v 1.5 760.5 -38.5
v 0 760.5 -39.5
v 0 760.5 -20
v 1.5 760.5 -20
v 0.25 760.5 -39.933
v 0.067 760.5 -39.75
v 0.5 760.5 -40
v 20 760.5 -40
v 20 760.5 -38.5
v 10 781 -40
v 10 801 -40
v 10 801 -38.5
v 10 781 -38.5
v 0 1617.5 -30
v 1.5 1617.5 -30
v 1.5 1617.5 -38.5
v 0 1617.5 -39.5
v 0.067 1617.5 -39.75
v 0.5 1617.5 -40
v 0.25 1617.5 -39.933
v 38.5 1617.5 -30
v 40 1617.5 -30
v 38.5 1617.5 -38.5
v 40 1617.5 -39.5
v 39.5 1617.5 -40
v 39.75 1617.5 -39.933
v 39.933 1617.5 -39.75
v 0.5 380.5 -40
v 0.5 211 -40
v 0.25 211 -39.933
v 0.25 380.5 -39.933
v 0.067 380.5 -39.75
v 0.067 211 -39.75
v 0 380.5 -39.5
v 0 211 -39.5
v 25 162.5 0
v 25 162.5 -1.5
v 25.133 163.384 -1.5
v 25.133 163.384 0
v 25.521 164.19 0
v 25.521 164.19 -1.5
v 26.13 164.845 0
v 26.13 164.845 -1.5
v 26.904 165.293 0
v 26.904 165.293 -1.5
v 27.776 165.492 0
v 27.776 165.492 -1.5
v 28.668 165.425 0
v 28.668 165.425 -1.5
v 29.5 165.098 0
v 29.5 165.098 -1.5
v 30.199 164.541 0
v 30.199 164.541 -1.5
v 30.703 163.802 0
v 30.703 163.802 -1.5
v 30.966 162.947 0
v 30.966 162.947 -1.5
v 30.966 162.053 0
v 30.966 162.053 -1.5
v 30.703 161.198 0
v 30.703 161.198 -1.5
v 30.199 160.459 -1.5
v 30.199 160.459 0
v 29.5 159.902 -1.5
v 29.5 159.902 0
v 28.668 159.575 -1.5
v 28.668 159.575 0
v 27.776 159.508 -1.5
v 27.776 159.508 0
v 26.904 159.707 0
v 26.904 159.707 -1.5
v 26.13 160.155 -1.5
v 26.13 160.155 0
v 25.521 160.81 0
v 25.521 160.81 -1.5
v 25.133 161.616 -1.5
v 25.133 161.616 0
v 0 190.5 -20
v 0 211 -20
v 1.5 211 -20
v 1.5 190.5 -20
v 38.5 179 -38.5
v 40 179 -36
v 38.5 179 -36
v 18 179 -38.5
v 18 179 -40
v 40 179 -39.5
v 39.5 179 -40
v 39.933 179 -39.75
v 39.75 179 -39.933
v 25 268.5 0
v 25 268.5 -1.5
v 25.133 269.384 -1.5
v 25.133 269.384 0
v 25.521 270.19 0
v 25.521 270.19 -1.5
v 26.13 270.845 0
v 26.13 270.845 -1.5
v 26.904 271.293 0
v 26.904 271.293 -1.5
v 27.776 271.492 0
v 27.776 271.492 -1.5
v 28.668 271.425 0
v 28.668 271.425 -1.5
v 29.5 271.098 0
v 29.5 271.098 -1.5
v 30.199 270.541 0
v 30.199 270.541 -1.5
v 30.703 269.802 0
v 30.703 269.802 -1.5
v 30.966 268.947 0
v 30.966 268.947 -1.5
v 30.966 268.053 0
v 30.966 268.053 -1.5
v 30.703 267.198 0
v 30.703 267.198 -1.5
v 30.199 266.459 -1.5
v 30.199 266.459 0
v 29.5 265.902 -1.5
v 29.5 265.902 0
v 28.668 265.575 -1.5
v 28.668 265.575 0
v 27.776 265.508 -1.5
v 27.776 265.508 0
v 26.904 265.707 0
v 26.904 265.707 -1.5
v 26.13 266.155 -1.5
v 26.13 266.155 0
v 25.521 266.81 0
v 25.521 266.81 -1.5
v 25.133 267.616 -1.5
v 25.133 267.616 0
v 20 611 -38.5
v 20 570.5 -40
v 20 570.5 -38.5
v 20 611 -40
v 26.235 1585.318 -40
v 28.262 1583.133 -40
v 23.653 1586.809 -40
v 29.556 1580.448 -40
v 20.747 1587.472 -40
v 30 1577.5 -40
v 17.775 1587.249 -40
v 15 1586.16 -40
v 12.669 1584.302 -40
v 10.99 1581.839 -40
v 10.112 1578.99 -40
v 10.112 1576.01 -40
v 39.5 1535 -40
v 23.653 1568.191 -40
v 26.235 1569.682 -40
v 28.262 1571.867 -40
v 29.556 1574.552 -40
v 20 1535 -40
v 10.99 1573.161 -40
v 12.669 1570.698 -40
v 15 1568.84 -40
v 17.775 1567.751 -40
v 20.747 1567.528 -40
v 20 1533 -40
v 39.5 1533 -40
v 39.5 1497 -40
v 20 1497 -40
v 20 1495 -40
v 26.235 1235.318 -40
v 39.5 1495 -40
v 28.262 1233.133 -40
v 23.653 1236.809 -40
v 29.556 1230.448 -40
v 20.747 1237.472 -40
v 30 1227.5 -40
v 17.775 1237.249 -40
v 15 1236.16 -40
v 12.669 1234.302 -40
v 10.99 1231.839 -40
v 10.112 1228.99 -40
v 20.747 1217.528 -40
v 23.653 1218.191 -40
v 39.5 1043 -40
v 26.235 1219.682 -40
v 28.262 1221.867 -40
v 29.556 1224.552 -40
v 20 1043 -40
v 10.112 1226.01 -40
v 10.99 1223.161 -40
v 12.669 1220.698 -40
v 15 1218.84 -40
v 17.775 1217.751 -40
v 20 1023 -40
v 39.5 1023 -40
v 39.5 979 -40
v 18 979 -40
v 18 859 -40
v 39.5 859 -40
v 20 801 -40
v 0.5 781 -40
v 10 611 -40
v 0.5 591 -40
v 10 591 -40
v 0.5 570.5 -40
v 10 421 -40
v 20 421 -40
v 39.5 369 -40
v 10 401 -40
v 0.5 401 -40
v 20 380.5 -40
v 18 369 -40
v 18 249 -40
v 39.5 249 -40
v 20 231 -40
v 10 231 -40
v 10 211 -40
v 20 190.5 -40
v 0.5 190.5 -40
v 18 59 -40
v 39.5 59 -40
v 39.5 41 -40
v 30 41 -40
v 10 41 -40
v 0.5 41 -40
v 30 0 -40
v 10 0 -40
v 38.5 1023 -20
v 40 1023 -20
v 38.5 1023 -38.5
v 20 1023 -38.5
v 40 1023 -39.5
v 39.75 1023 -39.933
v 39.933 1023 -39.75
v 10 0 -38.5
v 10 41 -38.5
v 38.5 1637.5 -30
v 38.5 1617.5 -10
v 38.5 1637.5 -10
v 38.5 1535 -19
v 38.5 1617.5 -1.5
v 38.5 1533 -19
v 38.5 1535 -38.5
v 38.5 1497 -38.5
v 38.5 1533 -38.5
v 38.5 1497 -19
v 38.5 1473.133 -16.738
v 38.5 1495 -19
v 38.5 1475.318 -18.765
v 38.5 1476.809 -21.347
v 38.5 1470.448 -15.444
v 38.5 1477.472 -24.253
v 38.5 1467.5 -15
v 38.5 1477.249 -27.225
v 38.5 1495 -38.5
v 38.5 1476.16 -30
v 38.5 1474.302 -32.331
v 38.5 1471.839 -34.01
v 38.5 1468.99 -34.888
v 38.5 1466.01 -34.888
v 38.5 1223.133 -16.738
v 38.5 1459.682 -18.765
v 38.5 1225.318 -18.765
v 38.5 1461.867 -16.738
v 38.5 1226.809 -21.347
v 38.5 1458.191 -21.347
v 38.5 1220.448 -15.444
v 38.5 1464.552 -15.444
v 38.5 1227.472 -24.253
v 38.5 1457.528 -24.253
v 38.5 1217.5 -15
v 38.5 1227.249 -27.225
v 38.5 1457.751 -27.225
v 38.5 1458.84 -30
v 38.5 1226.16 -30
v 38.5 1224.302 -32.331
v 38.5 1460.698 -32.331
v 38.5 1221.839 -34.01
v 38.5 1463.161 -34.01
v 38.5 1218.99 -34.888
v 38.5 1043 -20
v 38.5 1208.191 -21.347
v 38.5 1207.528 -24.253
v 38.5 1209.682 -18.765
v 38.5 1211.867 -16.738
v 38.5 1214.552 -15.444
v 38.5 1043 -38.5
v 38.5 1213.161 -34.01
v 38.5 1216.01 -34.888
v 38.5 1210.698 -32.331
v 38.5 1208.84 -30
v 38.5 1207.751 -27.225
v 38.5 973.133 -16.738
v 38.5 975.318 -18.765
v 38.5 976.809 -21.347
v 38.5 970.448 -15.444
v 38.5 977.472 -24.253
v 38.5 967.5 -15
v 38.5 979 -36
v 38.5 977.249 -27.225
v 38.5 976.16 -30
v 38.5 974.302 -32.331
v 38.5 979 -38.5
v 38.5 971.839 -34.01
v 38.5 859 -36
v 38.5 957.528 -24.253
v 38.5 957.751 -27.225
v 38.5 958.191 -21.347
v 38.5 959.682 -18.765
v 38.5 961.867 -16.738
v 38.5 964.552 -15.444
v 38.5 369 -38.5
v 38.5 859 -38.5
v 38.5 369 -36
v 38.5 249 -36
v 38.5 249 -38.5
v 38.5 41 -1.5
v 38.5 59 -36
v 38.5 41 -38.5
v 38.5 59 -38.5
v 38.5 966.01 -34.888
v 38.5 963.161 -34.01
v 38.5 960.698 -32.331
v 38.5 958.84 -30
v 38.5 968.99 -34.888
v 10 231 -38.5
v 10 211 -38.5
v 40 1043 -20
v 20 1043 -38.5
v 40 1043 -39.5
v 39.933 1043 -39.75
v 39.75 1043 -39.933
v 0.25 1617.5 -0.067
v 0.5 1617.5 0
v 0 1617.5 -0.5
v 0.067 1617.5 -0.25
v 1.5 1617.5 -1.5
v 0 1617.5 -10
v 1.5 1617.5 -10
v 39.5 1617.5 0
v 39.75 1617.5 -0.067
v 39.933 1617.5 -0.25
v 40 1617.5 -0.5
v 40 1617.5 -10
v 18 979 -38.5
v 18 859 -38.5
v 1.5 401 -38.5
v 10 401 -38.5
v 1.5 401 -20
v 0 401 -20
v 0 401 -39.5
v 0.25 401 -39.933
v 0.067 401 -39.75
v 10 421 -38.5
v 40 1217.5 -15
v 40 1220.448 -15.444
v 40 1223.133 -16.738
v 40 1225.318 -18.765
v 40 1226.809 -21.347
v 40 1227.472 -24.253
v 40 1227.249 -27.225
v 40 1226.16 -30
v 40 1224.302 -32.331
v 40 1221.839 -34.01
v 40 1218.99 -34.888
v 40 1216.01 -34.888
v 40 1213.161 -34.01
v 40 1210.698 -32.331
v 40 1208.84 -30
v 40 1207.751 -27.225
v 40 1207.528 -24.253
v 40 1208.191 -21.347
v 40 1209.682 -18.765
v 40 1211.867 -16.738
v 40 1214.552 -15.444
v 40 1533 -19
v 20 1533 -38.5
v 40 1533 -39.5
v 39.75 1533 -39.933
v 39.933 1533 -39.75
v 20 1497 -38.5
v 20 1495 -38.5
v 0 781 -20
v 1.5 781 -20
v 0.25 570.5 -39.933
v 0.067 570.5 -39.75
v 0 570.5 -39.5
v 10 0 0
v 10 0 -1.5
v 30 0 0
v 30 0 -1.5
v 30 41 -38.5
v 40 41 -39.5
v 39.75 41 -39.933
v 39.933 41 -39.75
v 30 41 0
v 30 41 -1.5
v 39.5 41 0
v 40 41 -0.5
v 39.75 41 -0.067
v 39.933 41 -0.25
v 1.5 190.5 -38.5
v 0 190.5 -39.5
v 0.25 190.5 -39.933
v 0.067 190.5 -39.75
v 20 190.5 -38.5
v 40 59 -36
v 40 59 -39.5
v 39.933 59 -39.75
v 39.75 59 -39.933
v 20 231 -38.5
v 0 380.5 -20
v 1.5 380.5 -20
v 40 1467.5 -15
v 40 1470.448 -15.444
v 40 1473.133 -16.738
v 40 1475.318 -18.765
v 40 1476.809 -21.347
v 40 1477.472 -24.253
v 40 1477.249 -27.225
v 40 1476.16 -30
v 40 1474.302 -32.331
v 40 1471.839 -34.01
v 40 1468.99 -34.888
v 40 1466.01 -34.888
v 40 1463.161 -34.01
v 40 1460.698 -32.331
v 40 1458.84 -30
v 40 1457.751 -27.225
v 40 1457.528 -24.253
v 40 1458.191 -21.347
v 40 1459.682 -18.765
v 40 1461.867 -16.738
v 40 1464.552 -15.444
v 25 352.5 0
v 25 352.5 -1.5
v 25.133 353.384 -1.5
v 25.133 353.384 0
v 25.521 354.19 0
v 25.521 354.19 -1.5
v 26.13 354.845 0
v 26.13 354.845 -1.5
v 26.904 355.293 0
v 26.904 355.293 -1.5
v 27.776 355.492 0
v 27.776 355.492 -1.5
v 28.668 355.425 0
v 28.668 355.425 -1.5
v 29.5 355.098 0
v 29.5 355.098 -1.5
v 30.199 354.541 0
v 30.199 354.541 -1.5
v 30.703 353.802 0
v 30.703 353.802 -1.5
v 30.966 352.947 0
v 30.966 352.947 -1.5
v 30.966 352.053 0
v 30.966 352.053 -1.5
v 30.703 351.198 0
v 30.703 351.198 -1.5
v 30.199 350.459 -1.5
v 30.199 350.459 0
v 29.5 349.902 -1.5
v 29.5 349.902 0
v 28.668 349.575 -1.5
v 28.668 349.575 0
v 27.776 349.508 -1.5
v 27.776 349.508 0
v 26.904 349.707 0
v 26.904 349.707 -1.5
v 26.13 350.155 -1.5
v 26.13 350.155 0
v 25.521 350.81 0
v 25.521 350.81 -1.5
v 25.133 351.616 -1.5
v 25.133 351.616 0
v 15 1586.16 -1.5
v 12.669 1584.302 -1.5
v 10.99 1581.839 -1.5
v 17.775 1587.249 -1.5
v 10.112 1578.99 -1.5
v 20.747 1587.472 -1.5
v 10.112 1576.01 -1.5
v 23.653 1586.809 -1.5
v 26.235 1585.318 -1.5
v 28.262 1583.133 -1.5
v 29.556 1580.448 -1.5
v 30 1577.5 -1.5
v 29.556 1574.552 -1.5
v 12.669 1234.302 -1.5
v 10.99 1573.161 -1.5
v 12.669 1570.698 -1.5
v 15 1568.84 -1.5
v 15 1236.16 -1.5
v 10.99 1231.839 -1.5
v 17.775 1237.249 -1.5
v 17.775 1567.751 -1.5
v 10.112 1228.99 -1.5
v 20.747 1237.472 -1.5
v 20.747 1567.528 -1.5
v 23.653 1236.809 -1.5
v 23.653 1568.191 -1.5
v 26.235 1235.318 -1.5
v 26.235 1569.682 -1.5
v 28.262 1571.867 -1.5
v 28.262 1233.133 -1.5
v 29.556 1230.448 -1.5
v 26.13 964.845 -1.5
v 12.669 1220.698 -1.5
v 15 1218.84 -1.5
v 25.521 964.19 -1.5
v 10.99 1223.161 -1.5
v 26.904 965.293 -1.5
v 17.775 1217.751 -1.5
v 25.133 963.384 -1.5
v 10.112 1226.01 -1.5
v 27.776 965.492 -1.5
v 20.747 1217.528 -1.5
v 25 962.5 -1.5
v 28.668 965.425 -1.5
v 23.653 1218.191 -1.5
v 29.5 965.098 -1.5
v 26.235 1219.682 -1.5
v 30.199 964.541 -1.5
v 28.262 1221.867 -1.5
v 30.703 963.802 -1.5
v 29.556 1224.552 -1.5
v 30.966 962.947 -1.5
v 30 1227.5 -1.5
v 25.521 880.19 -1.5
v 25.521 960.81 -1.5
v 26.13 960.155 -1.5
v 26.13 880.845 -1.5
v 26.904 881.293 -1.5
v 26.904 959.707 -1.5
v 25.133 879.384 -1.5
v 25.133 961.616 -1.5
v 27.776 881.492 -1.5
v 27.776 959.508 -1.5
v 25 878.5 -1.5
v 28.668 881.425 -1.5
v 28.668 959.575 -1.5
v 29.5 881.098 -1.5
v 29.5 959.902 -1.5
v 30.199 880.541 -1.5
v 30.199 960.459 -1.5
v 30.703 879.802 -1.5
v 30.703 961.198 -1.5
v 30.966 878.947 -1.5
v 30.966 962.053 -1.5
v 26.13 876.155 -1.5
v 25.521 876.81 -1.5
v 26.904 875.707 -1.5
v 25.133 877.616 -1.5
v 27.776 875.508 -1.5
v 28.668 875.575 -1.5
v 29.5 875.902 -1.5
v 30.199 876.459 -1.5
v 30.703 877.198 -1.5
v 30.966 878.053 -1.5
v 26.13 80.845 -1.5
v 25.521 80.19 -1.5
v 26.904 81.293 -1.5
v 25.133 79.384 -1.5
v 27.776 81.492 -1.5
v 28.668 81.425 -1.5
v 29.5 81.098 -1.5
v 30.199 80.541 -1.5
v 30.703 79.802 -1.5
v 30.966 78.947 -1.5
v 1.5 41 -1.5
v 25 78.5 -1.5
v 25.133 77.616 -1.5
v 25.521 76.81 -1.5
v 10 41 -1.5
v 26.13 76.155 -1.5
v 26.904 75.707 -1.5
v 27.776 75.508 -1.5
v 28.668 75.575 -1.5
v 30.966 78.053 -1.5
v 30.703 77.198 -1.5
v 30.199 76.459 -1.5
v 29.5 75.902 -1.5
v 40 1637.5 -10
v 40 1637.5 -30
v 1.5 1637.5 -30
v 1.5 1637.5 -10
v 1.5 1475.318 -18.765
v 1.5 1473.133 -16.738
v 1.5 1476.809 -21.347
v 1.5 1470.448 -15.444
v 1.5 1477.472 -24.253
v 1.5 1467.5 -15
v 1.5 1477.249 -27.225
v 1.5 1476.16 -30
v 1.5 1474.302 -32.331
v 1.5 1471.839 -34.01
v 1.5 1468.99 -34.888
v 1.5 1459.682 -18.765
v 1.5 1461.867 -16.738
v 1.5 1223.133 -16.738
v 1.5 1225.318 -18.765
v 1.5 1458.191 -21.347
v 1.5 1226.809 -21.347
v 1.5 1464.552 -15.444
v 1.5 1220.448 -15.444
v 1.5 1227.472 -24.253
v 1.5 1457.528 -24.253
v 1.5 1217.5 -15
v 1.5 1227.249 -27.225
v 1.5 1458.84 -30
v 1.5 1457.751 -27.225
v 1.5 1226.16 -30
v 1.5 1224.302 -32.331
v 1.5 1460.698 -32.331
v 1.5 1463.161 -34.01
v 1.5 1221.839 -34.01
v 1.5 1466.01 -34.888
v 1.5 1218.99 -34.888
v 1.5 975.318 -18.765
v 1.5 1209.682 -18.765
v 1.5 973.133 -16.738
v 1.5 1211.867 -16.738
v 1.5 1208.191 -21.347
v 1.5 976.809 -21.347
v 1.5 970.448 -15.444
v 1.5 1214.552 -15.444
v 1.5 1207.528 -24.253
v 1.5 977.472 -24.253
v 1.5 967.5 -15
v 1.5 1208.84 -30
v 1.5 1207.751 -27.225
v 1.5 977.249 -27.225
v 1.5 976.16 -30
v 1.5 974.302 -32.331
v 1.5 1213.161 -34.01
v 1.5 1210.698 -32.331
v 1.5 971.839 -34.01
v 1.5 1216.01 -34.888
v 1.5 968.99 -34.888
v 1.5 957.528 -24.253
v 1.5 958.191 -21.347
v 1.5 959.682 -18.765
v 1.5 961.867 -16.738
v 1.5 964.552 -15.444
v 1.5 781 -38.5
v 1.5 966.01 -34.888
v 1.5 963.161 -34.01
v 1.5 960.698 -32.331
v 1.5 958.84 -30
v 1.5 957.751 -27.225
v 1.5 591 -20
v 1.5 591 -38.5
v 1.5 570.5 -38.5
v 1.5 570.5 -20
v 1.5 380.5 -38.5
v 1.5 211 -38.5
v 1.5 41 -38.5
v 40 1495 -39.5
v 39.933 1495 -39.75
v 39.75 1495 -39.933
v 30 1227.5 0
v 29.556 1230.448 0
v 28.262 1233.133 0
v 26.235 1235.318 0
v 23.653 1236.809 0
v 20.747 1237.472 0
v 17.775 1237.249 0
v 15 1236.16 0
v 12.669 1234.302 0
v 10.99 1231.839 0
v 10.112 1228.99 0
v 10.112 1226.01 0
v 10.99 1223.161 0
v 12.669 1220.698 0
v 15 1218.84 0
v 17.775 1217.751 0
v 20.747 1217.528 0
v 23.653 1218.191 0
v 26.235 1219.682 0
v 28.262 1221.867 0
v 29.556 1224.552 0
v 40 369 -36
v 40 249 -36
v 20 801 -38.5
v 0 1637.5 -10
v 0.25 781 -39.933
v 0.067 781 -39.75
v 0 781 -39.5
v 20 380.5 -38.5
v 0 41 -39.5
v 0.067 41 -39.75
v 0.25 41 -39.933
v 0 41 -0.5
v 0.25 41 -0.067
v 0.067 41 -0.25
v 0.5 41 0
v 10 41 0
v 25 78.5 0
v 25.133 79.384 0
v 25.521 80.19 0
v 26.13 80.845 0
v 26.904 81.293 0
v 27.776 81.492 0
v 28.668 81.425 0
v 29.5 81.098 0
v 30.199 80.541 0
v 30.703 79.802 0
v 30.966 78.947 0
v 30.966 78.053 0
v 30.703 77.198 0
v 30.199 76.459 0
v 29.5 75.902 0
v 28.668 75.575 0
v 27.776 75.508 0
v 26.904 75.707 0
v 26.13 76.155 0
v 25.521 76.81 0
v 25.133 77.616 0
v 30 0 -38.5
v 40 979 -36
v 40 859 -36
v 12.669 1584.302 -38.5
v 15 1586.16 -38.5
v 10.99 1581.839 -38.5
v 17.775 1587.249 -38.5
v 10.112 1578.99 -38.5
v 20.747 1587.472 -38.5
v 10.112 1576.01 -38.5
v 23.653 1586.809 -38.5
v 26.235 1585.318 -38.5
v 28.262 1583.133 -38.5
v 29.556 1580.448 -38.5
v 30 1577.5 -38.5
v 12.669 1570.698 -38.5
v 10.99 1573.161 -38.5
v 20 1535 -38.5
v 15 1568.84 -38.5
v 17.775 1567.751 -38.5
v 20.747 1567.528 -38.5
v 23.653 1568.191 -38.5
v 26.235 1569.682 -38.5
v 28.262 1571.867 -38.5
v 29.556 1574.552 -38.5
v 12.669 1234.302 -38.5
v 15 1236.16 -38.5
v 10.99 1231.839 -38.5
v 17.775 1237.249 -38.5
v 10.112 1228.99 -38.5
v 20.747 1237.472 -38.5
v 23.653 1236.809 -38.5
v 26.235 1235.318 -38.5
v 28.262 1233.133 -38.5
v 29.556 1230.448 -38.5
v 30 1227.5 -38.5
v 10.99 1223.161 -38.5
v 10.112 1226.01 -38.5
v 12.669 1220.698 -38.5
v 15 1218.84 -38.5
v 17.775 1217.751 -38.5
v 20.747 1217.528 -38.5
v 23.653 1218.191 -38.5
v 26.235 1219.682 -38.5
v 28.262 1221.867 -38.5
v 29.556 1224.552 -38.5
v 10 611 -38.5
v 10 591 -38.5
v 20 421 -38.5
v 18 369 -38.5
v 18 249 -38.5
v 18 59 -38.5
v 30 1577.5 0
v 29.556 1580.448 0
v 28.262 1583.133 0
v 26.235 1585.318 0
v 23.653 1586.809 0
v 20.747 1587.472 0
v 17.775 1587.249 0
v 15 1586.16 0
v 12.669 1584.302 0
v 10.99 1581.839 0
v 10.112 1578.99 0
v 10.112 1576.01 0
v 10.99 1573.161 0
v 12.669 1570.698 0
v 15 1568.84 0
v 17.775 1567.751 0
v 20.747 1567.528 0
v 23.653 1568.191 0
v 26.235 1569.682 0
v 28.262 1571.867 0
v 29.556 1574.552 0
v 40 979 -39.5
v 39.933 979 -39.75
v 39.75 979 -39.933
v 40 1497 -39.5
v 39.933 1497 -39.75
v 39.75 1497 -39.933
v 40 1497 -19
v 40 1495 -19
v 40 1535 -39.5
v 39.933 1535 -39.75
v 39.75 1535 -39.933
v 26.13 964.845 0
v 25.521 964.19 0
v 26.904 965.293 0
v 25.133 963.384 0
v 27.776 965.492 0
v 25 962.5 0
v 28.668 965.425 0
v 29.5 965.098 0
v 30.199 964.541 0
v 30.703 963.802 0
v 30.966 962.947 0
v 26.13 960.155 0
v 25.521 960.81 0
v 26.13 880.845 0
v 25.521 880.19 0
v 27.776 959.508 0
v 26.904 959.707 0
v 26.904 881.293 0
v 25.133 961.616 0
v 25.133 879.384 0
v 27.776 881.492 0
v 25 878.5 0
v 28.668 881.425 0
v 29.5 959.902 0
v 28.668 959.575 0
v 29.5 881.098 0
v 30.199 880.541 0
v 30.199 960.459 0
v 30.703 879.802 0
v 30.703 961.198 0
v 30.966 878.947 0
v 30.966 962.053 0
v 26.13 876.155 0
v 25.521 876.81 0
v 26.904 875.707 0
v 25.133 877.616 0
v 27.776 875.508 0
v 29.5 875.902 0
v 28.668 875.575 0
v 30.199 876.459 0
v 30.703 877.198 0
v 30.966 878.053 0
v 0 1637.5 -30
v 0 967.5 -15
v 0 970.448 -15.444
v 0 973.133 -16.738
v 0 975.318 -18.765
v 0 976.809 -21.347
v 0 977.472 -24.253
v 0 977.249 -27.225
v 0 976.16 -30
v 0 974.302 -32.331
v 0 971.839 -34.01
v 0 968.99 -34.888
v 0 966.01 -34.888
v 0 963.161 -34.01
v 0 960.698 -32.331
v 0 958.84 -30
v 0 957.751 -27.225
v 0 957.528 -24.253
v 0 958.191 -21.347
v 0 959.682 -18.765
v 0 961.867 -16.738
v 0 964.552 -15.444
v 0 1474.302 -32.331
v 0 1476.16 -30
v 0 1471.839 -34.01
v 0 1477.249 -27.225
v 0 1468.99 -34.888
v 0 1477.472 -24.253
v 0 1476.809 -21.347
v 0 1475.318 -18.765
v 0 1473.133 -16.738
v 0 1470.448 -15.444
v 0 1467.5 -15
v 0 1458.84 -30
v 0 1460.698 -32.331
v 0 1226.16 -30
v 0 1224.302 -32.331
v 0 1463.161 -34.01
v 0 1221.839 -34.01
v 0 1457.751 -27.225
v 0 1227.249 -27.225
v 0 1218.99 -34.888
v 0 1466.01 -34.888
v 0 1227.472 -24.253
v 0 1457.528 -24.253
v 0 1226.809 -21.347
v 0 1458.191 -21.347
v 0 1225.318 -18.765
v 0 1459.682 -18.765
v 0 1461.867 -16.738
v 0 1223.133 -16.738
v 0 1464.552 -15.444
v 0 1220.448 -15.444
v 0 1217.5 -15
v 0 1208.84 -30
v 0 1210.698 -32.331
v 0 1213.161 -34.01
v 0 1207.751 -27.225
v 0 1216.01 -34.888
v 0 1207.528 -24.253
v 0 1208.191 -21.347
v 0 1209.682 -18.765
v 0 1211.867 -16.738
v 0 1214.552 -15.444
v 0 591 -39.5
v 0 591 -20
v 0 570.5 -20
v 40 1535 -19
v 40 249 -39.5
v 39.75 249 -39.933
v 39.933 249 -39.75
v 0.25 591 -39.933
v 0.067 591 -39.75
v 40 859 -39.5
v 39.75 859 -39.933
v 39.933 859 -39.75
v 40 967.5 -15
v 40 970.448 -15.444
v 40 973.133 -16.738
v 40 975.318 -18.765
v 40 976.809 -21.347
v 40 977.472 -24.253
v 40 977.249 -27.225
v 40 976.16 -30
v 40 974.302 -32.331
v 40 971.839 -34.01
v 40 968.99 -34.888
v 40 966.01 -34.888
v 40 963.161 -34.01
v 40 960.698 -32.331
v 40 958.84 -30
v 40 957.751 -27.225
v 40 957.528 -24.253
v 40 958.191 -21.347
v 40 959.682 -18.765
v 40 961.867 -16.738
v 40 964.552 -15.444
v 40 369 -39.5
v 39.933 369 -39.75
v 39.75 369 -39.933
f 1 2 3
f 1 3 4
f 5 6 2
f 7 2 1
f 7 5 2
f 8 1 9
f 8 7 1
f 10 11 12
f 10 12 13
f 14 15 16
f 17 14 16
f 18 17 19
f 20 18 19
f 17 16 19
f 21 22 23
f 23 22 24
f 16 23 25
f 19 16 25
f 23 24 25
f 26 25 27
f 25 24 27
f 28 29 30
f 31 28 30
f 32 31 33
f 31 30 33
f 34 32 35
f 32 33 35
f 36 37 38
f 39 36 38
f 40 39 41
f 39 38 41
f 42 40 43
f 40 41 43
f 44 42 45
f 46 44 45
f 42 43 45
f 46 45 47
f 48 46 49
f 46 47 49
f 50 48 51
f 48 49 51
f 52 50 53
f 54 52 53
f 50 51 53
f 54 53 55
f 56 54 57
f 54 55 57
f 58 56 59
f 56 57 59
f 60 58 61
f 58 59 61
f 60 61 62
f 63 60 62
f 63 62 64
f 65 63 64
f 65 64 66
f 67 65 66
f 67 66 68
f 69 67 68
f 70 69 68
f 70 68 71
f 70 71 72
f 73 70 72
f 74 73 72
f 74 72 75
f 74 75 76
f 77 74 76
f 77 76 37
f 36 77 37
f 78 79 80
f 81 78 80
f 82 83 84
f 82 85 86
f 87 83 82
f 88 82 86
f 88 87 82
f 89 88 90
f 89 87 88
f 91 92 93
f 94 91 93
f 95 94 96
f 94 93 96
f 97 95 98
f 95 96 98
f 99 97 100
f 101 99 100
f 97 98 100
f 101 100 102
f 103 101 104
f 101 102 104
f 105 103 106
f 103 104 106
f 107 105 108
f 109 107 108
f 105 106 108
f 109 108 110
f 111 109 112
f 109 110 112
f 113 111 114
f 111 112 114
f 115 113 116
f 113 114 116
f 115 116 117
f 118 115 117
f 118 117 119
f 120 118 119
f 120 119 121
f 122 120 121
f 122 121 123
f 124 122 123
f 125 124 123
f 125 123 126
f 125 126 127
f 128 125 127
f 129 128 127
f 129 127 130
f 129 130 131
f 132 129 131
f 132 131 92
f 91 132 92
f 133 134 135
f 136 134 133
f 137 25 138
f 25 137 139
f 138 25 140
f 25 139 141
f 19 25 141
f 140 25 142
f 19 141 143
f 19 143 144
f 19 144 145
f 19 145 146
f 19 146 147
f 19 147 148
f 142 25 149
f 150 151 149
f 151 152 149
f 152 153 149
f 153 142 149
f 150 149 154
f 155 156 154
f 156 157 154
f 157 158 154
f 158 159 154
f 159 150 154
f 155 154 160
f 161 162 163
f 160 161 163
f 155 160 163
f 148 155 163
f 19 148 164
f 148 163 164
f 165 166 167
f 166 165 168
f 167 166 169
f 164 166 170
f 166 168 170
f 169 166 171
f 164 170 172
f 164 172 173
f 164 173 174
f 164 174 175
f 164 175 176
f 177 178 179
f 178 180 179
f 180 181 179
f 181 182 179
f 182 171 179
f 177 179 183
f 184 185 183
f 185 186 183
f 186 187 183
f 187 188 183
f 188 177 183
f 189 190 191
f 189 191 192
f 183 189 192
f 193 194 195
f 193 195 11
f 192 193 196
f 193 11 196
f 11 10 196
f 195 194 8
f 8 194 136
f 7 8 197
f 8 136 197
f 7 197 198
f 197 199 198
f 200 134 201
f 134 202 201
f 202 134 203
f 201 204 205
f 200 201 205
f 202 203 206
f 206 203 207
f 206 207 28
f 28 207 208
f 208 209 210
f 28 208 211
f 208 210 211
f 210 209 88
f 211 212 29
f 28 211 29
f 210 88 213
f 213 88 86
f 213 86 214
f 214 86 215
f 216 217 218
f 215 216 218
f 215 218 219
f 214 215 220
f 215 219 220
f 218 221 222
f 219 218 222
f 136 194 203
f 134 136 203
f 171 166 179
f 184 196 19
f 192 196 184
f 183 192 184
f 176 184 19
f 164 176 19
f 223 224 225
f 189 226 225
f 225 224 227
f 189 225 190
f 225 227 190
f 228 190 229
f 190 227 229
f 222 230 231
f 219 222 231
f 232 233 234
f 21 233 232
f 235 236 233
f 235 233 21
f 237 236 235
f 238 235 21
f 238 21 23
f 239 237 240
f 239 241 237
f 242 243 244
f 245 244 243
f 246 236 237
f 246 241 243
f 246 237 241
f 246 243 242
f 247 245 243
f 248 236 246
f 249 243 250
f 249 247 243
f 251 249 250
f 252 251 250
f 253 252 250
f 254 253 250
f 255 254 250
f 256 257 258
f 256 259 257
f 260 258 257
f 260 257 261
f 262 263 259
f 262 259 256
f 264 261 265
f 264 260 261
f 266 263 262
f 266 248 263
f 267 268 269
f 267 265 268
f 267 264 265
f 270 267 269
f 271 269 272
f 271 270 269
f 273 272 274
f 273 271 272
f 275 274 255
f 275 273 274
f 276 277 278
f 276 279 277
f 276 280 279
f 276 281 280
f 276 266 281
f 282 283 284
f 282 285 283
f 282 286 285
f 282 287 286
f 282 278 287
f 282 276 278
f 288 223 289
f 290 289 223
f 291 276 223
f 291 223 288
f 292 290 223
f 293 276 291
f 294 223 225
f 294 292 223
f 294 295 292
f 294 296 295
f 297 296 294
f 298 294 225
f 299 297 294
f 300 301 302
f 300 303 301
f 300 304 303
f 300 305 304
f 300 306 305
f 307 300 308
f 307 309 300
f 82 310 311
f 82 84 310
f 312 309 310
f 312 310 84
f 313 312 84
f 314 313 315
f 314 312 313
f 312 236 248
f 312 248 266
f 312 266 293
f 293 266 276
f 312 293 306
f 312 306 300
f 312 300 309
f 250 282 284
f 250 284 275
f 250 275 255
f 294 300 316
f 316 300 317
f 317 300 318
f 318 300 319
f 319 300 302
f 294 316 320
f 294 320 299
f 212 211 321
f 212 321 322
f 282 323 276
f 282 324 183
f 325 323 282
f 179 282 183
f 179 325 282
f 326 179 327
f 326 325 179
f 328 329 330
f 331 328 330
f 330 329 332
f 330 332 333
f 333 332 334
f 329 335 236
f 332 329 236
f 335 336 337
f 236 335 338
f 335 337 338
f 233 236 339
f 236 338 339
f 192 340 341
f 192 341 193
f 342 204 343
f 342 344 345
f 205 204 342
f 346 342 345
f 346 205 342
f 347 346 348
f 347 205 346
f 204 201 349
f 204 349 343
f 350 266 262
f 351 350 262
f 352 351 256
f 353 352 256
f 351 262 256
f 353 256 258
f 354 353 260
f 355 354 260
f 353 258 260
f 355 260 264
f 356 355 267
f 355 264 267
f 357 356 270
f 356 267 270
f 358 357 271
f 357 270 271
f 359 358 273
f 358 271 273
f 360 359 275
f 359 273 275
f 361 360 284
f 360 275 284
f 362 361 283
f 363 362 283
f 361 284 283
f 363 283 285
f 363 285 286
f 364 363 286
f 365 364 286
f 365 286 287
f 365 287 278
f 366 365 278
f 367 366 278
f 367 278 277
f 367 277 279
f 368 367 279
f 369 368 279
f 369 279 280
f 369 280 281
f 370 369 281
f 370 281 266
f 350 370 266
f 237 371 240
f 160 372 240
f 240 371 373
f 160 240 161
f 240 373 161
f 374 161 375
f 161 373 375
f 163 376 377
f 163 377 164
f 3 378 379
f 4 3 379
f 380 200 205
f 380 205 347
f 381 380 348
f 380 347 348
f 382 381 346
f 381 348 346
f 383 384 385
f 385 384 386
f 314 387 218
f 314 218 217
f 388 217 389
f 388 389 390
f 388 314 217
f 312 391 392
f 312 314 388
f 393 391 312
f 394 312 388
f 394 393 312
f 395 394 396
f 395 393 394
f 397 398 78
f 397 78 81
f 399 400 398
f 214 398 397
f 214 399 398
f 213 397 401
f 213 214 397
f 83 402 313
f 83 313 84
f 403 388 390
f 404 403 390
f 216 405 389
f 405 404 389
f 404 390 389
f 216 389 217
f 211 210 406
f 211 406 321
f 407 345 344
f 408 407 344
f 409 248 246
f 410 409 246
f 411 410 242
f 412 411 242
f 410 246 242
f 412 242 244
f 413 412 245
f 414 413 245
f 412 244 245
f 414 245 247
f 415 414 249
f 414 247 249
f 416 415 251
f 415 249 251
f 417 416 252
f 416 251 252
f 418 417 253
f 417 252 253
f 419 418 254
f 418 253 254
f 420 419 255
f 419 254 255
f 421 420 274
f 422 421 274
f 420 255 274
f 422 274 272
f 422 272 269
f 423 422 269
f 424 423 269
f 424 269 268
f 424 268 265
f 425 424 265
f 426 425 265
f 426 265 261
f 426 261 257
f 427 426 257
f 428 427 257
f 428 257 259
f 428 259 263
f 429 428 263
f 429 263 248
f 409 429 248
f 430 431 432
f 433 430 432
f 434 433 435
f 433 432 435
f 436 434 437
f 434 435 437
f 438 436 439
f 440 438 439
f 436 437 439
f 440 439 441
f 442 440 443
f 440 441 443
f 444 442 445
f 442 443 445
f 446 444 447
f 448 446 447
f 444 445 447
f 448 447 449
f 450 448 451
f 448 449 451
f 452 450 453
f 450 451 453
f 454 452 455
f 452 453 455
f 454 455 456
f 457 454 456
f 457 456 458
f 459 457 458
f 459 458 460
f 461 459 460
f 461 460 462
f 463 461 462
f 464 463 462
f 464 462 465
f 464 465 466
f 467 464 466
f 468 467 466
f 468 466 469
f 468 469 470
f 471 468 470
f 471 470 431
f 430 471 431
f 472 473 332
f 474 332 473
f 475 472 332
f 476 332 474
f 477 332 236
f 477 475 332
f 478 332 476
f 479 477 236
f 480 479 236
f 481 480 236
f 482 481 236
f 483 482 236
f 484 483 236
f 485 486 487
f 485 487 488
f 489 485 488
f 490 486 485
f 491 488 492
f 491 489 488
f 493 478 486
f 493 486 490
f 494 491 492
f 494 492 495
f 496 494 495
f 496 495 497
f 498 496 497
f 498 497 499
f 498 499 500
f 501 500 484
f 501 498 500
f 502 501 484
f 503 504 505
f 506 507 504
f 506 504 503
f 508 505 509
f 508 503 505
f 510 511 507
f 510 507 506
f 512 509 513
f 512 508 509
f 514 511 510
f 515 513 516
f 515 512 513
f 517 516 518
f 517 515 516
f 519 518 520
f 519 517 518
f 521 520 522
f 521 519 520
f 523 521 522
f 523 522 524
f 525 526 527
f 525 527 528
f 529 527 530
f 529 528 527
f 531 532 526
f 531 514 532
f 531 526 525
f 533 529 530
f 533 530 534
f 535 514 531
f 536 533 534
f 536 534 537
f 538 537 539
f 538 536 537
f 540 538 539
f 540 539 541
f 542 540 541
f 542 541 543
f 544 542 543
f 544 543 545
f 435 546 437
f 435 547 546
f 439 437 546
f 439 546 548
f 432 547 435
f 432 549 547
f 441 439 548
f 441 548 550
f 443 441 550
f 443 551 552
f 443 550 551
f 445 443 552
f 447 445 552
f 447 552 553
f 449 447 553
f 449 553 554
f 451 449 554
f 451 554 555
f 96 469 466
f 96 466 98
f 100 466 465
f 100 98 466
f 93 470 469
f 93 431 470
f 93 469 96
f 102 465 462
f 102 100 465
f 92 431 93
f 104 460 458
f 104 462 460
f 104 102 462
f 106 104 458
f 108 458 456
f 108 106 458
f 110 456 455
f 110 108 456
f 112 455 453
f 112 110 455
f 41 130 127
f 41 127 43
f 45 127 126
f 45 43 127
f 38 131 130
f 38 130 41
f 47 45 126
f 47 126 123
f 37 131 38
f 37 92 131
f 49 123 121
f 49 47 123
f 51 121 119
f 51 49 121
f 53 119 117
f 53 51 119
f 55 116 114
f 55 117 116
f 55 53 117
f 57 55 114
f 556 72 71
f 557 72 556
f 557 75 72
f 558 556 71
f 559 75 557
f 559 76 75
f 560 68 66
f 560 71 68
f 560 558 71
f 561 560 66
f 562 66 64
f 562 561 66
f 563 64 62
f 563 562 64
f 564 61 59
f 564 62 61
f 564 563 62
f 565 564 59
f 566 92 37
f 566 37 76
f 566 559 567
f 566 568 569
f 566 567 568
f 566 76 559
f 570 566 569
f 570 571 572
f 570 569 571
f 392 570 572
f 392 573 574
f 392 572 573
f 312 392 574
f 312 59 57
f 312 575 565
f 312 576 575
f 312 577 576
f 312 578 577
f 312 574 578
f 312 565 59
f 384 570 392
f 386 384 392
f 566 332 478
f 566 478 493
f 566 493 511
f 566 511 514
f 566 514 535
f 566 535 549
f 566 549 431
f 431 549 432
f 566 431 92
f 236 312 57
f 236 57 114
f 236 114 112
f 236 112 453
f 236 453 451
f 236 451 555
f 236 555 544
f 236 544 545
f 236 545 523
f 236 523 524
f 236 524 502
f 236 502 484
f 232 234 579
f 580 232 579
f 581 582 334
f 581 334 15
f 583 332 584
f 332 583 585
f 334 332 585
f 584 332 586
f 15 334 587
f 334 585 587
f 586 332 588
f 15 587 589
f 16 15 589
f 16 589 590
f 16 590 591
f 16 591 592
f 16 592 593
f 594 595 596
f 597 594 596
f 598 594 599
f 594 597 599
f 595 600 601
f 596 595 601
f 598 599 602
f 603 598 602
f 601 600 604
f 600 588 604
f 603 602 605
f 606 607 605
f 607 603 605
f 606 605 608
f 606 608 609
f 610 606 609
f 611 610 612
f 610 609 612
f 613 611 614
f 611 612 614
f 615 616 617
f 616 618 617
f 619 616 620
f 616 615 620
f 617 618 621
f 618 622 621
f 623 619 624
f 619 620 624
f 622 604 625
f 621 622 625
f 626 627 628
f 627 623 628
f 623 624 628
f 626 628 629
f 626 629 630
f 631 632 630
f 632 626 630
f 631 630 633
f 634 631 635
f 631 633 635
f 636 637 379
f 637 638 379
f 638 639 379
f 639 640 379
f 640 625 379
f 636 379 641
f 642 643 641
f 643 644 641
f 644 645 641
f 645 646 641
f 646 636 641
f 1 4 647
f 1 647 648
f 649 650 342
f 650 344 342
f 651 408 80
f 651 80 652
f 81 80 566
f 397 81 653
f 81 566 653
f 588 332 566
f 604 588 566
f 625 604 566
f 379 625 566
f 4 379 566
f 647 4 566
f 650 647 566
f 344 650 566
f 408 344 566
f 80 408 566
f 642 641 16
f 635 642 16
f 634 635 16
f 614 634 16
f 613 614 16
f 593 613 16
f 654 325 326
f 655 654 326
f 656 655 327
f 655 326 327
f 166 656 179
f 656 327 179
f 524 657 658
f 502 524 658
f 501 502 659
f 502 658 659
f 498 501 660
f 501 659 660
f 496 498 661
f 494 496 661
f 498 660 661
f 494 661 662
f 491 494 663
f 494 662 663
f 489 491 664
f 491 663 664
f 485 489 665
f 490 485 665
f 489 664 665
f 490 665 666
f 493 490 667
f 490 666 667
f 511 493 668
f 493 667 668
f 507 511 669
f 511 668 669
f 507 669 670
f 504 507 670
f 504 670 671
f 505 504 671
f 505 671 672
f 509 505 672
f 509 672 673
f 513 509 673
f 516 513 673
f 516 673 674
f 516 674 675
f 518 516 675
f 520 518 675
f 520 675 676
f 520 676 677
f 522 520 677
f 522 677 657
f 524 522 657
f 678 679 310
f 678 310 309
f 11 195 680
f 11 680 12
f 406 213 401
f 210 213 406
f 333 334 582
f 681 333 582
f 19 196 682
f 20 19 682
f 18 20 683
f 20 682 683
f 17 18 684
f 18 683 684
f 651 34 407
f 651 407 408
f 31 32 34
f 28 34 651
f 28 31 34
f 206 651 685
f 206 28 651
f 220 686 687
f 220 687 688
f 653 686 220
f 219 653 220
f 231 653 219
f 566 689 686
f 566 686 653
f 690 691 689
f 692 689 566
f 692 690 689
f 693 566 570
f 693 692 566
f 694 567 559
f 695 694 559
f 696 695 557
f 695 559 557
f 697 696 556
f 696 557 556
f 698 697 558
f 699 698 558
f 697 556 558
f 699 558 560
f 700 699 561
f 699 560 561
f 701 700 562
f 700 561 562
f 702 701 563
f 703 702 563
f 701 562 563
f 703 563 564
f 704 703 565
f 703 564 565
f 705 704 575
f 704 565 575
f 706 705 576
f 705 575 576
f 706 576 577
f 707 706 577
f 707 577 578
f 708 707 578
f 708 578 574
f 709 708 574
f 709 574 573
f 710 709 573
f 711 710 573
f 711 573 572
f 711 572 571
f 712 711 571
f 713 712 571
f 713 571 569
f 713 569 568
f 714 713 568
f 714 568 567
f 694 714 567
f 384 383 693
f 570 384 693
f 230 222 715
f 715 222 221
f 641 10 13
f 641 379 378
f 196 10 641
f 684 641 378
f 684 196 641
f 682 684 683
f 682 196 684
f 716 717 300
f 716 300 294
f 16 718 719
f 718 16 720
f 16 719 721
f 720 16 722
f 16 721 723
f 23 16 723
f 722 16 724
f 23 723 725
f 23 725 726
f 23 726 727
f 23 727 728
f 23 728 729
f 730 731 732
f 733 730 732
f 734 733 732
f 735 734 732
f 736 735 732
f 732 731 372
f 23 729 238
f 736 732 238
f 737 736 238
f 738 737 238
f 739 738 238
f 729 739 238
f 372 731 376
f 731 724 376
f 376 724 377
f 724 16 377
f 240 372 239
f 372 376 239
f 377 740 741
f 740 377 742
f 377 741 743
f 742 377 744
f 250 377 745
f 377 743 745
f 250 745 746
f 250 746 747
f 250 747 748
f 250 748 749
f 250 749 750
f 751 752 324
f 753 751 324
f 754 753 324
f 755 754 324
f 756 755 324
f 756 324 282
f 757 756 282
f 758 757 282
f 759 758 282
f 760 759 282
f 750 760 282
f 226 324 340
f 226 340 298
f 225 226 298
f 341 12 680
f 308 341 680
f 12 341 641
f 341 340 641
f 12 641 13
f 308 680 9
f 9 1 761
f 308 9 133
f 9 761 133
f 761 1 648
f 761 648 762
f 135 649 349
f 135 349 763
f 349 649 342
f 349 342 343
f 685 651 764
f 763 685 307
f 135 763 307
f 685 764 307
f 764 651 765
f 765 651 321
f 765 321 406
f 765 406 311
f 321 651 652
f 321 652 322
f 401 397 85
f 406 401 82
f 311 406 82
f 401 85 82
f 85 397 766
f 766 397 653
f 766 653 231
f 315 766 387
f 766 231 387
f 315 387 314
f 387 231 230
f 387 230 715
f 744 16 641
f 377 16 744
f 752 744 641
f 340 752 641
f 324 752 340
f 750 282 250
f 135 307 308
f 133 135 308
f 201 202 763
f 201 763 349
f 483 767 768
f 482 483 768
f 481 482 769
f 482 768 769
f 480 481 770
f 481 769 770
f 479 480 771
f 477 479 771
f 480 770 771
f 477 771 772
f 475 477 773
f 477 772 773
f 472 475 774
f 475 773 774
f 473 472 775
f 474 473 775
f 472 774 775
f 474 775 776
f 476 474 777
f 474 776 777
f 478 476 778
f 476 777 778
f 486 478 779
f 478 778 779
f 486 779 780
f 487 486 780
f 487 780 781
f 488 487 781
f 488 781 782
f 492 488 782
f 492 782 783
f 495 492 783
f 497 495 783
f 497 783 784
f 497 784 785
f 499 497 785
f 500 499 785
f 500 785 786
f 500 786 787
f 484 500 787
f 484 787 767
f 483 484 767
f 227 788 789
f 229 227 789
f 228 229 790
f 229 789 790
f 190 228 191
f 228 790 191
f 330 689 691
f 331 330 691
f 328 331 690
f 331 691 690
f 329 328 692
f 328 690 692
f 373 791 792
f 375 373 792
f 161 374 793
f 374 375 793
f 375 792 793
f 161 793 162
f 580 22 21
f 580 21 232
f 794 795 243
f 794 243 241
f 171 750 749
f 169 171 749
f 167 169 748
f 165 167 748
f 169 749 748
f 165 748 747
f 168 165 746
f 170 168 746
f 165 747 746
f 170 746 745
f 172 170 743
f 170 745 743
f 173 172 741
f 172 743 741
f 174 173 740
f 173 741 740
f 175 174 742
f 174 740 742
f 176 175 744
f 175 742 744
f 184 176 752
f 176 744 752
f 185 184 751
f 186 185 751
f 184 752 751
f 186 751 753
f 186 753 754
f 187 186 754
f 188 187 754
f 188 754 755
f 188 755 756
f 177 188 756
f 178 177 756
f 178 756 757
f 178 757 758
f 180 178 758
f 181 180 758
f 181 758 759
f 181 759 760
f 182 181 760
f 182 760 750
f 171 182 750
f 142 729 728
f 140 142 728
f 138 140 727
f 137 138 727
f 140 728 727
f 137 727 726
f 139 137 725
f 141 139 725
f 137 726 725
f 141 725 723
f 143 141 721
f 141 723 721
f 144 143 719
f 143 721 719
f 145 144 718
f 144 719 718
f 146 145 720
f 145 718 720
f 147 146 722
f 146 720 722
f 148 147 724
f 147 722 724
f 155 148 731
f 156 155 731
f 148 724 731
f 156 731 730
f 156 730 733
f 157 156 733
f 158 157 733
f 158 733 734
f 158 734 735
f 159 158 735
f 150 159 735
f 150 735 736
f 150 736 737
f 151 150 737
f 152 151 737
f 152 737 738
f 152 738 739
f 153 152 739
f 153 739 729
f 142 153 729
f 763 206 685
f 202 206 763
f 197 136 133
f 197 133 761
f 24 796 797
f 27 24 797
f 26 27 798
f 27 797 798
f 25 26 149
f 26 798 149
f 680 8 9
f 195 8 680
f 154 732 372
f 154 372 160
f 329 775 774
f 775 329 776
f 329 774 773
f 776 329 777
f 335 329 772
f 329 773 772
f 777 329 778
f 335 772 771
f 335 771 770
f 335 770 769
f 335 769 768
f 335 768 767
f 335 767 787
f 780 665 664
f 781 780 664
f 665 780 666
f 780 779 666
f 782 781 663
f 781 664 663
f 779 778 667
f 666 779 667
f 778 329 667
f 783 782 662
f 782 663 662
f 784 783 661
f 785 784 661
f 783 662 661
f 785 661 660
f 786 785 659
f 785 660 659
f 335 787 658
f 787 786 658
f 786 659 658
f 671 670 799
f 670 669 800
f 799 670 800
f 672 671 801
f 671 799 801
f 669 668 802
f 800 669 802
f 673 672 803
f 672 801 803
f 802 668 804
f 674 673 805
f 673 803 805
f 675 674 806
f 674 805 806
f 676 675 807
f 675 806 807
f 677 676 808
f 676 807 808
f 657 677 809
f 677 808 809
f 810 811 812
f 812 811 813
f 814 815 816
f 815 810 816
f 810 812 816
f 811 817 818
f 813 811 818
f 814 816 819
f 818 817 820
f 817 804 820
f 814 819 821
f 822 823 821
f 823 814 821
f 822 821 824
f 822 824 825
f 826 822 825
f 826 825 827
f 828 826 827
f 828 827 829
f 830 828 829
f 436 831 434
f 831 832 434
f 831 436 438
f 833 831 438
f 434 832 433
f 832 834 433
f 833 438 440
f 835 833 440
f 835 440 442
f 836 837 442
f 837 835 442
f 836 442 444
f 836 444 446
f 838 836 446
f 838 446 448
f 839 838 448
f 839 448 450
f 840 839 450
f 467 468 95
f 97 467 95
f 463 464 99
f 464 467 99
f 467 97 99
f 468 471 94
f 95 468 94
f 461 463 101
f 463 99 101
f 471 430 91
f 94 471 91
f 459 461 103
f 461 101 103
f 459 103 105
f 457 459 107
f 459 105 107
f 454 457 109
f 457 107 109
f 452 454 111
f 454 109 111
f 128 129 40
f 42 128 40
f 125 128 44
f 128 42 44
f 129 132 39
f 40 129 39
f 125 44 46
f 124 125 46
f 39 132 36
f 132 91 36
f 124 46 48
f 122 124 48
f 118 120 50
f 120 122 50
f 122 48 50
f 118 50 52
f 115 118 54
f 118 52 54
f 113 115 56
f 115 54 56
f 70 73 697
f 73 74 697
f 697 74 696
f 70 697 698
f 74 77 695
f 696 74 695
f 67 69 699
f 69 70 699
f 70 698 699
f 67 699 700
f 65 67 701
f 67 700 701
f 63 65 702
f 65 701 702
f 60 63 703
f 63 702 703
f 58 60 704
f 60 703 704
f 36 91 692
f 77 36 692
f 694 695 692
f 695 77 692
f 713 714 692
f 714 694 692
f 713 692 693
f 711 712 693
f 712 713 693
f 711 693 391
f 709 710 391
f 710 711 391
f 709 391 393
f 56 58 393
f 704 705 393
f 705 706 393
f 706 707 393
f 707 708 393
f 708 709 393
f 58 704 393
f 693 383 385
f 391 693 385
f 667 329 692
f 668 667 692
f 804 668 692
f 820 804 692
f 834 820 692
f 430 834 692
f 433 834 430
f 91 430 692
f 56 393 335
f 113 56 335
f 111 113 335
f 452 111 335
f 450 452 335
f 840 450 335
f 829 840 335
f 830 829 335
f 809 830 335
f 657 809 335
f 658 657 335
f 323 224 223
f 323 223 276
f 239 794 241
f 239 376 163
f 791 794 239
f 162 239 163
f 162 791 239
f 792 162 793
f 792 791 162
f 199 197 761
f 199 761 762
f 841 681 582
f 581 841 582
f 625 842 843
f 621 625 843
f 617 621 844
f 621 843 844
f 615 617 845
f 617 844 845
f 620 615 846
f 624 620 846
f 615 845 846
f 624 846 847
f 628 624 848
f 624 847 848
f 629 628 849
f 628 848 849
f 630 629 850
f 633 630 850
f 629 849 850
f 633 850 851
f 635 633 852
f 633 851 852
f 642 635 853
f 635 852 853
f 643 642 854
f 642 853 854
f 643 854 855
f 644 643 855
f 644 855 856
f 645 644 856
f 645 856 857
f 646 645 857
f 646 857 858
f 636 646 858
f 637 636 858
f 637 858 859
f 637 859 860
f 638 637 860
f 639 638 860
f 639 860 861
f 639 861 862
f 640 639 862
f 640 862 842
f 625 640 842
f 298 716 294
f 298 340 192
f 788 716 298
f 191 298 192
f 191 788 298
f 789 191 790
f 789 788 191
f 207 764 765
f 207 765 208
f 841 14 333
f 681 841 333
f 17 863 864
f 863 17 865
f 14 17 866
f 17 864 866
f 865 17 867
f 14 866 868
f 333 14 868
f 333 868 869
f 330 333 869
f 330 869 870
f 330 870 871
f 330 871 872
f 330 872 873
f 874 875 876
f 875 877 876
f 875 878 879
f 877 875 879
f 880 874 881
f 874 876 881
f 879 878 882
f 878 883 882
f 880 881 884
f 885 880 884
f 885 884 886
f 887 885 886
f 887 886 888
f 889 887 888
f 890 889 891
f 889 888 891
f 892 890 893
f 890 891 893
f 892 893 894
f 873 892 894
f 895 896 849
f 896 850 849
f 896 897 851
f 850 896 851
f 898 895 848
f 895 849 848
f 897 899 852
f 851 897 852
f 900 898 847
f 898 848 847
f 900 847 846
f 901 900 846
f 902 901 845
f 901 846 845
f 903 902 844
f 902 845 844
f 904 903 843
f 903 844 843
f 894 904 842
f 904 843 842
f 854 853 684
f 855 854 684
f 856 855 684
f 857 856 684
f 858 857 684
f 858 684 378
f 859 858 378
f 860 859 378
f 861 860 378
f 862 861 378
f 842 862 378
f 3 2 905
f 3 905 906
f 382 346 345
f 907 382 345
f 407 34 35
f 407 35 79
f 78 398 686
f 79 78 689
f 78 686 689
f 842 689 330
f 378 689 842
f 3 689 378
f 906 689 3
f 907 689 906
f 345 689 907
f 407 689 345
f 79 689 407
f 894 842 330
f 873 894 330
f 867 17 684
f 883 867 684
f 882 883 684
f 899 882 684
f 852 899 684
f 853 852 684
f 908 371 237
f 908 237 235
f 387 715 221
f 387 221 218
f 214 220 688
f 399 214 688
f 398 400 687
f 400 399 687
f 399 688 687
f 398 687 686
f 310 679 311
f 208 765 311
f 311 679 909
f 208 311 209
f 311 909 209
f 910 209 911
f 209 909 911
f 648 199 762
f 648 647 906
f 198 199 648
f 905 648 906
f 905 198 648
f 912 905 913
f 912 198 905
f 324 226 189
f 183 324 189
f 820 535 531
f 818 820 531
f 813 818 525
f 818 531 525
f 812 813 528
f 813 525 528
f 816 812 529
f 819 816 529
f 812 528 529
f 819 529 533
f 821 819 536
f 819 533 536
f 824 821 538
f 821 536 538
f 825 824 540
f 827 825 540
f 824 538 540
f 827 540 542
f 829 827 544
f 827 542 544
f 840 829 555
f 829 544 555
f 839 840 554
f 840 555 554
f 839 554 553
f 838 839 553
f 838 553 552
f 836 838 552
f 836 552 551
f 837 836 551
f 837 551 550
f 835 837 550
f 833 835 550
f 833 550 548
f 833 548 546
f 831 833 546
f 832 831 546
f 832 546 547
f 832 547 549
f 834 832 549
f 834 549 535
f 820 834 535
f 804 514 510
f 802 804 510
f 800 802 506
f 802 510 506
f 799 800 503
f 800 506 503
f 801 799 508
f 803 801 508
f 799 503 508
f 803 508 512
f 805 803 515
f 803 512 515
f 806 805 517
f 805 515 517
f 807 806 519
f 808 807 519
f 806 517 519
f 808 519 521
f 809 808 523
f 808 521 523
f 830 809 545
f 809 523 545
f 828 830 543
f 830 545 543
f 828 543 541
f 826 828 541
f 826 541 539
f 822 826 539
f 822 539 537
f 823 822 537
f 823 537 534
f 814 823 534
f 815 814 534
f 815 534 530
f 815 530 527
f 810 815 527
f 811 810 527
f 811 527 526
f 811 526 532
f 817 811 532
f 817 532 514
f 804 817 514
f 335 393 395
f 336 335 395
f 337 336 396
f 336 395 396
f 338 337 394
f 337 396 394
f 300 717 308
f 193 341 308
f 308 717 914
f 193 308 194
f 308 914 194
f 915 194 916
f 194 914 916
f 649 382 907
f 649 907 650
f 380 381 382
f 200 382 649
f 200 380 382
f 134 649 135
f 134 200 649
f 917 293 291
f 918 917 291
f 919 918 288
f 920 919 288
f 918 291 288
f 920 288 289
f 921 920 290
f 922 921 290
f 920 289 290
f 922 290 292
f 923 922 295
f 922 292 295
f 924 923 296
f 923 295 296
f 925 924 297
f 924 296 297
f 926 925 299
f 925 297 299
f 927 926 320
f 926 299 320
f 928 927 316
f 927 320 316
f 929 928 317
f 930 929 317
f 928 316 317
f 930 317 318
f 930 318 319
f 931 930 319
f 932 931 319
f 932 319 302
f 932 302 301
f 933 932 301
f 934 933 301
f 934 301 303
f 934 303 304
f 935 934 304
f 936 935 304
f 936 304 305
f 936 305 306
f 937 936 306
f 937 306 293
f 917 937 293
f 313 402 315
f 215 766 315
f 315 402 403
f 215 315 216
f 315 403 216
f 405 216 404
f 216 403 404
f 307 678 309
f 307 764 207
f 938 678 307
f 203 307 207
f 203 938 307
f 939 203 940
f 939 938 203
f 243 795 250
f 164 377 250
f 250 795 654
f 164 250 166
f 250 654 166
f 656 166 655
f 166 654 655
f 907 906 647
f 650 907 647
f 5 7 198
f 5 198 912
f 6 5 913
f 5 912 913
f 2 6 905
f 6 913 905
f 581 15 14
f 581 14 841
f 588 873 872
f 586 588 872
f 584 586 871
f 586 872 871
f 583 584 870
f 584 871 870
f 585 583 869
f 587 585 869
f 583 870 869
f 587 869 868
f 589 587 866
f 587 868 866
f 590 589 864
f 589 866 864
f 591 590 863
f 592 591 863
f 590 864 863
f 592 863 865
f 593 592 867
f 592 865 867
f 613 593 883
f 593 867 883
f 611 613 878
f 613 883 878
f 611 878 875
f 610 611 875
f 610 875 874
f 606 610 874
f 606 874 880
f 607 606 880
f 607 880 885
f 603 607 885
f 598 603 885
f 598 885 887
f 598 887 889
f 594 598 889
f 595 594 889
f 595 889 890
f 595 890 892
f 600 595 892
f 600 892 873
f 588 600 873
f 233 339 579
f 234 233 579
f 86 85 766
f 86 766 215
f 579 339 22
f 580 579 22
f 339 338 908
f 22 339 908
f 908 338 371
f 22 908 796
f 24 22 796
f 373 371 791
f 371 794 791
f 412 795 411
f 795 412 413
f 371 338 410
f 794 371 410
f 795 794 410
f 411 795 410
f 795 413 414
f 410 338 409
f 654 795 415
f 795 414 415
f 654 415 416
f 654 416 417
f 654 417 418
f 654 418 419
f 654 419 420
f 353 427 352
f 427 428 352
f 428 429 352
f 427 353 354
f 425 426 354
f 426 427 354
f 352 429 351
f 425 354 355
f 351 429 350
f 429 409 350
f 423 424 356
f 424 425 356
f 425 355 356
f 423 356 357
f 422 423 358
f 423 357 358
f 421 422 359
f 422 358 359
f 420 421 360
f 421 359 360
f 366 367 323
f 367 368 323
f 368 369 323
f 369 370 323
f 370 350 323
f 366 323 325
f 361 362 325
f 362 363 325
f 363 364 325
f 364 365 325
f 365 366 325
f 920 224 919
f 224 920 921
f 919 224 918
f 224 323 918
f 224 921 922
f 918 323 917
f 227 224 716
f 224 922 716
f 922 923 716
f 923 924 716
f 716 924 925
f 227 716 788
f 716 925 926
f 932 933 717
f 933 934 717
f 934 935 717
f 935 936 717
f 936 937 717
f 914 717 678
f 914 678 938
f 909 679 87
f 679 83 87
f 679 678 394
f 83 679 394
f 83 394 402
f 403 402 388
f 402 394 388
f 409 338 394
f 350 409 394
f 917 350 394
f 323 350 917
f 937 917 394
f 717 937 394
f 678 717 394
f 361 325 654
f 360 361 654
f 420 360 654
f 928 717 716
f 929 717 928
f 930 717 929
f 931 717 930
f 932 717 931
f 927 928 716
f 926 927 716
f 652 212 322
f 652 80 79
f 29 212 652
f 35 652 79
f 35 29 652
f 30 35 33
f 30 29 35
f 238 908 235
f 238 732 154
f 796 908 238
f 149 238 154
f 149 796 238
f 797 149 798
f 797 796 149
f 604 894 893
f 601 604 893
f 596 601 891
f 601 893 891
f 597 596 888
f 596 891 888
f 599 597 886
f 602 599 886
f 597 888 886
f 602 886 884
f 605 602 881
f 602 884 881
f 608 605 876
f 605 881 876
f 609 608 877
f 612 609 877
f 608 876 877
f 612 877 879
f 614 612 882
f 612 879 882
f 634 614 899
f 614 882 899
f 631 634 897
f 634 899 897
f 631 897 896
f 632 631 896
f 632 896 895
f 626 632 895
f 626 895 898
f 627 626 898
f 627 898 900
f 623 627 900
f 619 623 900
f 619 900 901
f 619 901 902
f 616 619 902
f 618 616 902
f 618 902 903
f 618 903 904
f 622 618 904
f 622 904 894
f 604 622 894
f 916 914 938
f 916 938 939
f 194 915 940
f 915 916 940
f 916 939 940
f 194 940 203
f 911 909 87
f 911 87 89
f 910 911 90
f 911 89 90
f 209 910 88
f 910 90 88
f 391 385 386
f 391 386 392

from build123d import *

# Parameters (mm, degrees)
SKETCH1_W           = 37
SKETCH1_H           = 37
BOSS_EXTRUDE1_DEPTH = 1637.5
SKETCH2_W           = 10
SKETCH2_H           = 20
CUT_EXTRUDE1_DEPTH  = 40
SKETCH3_W           = 21
SKETCH3_H           = 2
CUT_EXTRUDE2_DEPTH  = 20
SKETCH4_W           = 10
SKETCH4_H           = 41
CUT_EXTRUDE3_DEPTH  = 1639.476807892
CUT_EXTRUDE4_DEPTH  = 20
SKETCH7_W           = 20
SKETCH7_H           = 20
CUT_EXTRUDE6_DEPTH  = 20
SKETCH8_W           = 4
SKETCH8_H           = 120
CUT_EXTRUDE7_DEPTH  = 22
SKETCH9_R           = 3
CUT_EXTRUDE8_DEPTH  = 22
LPATTERN1_COUNT     = 2
LPATTERN1_PITCH     = 190
LPATTERN2_COUNT     = 2
LPATTERN2_PITCH     = 800
SKETCH10_R          = 10
CUT_EXTRUDE9_DEPTH  = 1639.476807892
SKETCH11_R          = 10
CUT_EXTRUDE10_DEPTH = 1639.476807892


with BuildPart() as part:
    # Sketch1 → Boss-Extrude1 (new body)
    with BuildSketch(Plane(origin=(0, 0, 0), x_dir=(1, 0, 0), z_dir=(0, 1, 0))):
        with BuildLine():
            Line((0.5, 0), (39.5, 0))
            ThreePointArc((39.5, 0), (39.853553391, 0.146446609), (40, 0.5))
            Line((40, 0.5), (40, 39.5))
            ThreePointArc((40, 39.5), (39.853553391, 39.853553391), (39.5, 40))
            Line((39.5, 40), (0.5, 40))
            ThreePointArc((0.5, 40), (0.146446609, 39.853553391), (0, 39.5))
            Line((0, 39.5), (0, 0.5))
            ThreePointArc((0, 0.5), (0.146446609, 0.146446609), (0.5, 0))
        make_face()
        with Locations((20, 20)):
            Rectangle(SKETCH1_W, SKETCH1_H, mode=Mode.SUBTRACT)
    extrude(amount=BOSS_EXTRUDE1_DEPTH)

    # Sketch2 → Cut-Extrude1 (cut)
    with BuildSketch(Plane(origin=(40, 0, 0), x_dir=(0, 0, -1), z_dir=(1, 0, 0))):
        with Locations((35, 1627.5)):
            Rectangle(SKETCH2_W, SKETCH2_H)
        with Locations((5, 1627.5)):
            Rectangle(SKETCH2_W, SKETCH2_H)
    extrude(amount=-CUT_EXTRUDE1_DEPTH, mode=Mode.SUBTRACT)

    # Sketch3 → Cut-Extrude2 (cut)
    with BuildSketch(Plane(origin=(40, 0, 0), x_dir=(0, 0, -1), z_dir=(1, 0, 0))):
        with Locations((29.5, 1534)):
            Rectangle(SKETCH3_W, SKETCH3_H)
        with Locations((29.5, 1496)):
            Rectangle(SKETCH3_W, SKETCH3_H)
    extrude(amount=-CUT_EXTRUDE2_DEPTH, mode=Mode.SUBTRACT)

    # Sketch4 → Cut-Extrude3 (cut, through all)
    with BuildSketch(Plane.XY):
        with Locations((35, 20.5)):
            Rectangle(SKETCH4_W, SKETCH4_H)
        with Locations((5, 20.5)):
            Rectangle(SKETCH4_W, SKETCH4_H)
    extrude(amount=-CUT_EXTRUDE3_DEPTH, mode=Mode.SUBTRACT)

    # Sketch5 → Cut-Extrude4 (cut)
    with BuildSketch(Plane(origin=(40, 0, -40), x_dir=(1, 0, 0), z_dir=(0, 0, 1))):
        Polygon((-40, 190.5), (-20, 190.5), (-20, 231), (-30, 231), (-30, 211), (-40, 211), align=None)
        Polygon((-40, 380.5), (-20, 380.5), (-20, 421), (-30, 421), (-30, 401), (-40, 401), align=None)
        Polygon((-40, 570.5), (-20, 570.5), (-20, 611), (-30, 611), (-30, 591), (-40, 591), align=None)
        Polygon((-40, 760.5), (-20, 760.5), (-20, 801), (-30, 801), (-30, 781), (-40, 781), align=None)
    extrude(amount=CUT_EXTRUDE4_DEPTH, mode=Mode.SUBTRACT)

    # Sketch7 → Cut-Extrude6 (cut)
    with BuildSketch(Plane(origin=(40, 0, 0), x_dir=(0, 0, -1), z_dir=(1, 0, 0))):
        with Locations((30, 1033)):
            Rectangle(SKETCH7_W, SKETCH7_H)
    extrude(amount=-CUT_EXTRUDE6_DEPTH, mode=Mode.SUBTRACT)

    # Sketch8 → Cut-Extrude7 (cut)
    with BuildSketch(Plane(origin=(40, 0, 0), x_dir=(0, 0, -1), z_dir=(1, 0, 0))):
        with Locations((38, 119)):
            Rectangle(SKETCH8_W, SKETCH8_H)
    cut_extrude7 = extrude(amount=-CUT_EXTRUDE7_DEPTH, mode=Mode.SUBTRACT)

    # Sketch9 → Cut-Extrude8 (cut)
    with BuildSketch(Plane(origin=(0, 0, -1.5), x_dir=(-1, 0, 0), z_dir=(0, 0, -1))):
        with Locations((-28, 162.5)):
            Circle(SKETCH9_R)
        with Locations((-28, 78.5)):
            Circle(SKETCH9_R)
    cut_extrude8 = extrude(amount=-CUT_EXTRUDE8_DEPTH, mode=Mode.SUBTRACT)

    # LPattern1: Cut-Extrude7, Cut-Extrude8 ×2
    with Locations(*[(0, i * LPATTERN1_PITCH, 0) for i in range(1, LPATTERN1_COUNT)]):
        add(cut_extrude7, mode=Mode.SUBTRACT)
        add(cut_extrude8, mode=Mode.SUBTRACT)

    # LPattern2: Cut-Extrude7, Cut-Extrude8 ×2
    with Locations(*[(0, i * LPATTERN2_PITCH, 0) for i in range(1, LPATTERN2_COUNT)]):
        add(cut_extrude7, mode=Mode.SUBTRACT)
        add(cut_extrude8, mode=Mode.SUBTRACT)

    # Sketch10 → Cut-Extrude9 (cut, through all)
    with BuildSketch(Plane.XY):
        with Locations((20, 1577.5)):
            Circle(SKETCH10_R)
        with Locations((20, 1227.5)):
            Circle(SKETCH10_R)
    extrude(amount=-CUT_EXTRUDE9_DEPTH, mode=Mode.SUBTRACT)

    # Sketch11 → Cut-Extrude10 (cut, through all)
    with BuildSketch(Plane.ZY):
        with Locations((-25, 1467.5)):
            Circle(SKETCH11_R)
        with Locations((-25, 1217.5)):
            Circle(SKETCH11_R)
        with Locations((-25, 967.5)):
            Circle(SKETCH11_R)
    extrude(amount=-CUT_EXTRUDE10_DEPTH, mode=Mode.SUBTRACT)


solid = part.part
